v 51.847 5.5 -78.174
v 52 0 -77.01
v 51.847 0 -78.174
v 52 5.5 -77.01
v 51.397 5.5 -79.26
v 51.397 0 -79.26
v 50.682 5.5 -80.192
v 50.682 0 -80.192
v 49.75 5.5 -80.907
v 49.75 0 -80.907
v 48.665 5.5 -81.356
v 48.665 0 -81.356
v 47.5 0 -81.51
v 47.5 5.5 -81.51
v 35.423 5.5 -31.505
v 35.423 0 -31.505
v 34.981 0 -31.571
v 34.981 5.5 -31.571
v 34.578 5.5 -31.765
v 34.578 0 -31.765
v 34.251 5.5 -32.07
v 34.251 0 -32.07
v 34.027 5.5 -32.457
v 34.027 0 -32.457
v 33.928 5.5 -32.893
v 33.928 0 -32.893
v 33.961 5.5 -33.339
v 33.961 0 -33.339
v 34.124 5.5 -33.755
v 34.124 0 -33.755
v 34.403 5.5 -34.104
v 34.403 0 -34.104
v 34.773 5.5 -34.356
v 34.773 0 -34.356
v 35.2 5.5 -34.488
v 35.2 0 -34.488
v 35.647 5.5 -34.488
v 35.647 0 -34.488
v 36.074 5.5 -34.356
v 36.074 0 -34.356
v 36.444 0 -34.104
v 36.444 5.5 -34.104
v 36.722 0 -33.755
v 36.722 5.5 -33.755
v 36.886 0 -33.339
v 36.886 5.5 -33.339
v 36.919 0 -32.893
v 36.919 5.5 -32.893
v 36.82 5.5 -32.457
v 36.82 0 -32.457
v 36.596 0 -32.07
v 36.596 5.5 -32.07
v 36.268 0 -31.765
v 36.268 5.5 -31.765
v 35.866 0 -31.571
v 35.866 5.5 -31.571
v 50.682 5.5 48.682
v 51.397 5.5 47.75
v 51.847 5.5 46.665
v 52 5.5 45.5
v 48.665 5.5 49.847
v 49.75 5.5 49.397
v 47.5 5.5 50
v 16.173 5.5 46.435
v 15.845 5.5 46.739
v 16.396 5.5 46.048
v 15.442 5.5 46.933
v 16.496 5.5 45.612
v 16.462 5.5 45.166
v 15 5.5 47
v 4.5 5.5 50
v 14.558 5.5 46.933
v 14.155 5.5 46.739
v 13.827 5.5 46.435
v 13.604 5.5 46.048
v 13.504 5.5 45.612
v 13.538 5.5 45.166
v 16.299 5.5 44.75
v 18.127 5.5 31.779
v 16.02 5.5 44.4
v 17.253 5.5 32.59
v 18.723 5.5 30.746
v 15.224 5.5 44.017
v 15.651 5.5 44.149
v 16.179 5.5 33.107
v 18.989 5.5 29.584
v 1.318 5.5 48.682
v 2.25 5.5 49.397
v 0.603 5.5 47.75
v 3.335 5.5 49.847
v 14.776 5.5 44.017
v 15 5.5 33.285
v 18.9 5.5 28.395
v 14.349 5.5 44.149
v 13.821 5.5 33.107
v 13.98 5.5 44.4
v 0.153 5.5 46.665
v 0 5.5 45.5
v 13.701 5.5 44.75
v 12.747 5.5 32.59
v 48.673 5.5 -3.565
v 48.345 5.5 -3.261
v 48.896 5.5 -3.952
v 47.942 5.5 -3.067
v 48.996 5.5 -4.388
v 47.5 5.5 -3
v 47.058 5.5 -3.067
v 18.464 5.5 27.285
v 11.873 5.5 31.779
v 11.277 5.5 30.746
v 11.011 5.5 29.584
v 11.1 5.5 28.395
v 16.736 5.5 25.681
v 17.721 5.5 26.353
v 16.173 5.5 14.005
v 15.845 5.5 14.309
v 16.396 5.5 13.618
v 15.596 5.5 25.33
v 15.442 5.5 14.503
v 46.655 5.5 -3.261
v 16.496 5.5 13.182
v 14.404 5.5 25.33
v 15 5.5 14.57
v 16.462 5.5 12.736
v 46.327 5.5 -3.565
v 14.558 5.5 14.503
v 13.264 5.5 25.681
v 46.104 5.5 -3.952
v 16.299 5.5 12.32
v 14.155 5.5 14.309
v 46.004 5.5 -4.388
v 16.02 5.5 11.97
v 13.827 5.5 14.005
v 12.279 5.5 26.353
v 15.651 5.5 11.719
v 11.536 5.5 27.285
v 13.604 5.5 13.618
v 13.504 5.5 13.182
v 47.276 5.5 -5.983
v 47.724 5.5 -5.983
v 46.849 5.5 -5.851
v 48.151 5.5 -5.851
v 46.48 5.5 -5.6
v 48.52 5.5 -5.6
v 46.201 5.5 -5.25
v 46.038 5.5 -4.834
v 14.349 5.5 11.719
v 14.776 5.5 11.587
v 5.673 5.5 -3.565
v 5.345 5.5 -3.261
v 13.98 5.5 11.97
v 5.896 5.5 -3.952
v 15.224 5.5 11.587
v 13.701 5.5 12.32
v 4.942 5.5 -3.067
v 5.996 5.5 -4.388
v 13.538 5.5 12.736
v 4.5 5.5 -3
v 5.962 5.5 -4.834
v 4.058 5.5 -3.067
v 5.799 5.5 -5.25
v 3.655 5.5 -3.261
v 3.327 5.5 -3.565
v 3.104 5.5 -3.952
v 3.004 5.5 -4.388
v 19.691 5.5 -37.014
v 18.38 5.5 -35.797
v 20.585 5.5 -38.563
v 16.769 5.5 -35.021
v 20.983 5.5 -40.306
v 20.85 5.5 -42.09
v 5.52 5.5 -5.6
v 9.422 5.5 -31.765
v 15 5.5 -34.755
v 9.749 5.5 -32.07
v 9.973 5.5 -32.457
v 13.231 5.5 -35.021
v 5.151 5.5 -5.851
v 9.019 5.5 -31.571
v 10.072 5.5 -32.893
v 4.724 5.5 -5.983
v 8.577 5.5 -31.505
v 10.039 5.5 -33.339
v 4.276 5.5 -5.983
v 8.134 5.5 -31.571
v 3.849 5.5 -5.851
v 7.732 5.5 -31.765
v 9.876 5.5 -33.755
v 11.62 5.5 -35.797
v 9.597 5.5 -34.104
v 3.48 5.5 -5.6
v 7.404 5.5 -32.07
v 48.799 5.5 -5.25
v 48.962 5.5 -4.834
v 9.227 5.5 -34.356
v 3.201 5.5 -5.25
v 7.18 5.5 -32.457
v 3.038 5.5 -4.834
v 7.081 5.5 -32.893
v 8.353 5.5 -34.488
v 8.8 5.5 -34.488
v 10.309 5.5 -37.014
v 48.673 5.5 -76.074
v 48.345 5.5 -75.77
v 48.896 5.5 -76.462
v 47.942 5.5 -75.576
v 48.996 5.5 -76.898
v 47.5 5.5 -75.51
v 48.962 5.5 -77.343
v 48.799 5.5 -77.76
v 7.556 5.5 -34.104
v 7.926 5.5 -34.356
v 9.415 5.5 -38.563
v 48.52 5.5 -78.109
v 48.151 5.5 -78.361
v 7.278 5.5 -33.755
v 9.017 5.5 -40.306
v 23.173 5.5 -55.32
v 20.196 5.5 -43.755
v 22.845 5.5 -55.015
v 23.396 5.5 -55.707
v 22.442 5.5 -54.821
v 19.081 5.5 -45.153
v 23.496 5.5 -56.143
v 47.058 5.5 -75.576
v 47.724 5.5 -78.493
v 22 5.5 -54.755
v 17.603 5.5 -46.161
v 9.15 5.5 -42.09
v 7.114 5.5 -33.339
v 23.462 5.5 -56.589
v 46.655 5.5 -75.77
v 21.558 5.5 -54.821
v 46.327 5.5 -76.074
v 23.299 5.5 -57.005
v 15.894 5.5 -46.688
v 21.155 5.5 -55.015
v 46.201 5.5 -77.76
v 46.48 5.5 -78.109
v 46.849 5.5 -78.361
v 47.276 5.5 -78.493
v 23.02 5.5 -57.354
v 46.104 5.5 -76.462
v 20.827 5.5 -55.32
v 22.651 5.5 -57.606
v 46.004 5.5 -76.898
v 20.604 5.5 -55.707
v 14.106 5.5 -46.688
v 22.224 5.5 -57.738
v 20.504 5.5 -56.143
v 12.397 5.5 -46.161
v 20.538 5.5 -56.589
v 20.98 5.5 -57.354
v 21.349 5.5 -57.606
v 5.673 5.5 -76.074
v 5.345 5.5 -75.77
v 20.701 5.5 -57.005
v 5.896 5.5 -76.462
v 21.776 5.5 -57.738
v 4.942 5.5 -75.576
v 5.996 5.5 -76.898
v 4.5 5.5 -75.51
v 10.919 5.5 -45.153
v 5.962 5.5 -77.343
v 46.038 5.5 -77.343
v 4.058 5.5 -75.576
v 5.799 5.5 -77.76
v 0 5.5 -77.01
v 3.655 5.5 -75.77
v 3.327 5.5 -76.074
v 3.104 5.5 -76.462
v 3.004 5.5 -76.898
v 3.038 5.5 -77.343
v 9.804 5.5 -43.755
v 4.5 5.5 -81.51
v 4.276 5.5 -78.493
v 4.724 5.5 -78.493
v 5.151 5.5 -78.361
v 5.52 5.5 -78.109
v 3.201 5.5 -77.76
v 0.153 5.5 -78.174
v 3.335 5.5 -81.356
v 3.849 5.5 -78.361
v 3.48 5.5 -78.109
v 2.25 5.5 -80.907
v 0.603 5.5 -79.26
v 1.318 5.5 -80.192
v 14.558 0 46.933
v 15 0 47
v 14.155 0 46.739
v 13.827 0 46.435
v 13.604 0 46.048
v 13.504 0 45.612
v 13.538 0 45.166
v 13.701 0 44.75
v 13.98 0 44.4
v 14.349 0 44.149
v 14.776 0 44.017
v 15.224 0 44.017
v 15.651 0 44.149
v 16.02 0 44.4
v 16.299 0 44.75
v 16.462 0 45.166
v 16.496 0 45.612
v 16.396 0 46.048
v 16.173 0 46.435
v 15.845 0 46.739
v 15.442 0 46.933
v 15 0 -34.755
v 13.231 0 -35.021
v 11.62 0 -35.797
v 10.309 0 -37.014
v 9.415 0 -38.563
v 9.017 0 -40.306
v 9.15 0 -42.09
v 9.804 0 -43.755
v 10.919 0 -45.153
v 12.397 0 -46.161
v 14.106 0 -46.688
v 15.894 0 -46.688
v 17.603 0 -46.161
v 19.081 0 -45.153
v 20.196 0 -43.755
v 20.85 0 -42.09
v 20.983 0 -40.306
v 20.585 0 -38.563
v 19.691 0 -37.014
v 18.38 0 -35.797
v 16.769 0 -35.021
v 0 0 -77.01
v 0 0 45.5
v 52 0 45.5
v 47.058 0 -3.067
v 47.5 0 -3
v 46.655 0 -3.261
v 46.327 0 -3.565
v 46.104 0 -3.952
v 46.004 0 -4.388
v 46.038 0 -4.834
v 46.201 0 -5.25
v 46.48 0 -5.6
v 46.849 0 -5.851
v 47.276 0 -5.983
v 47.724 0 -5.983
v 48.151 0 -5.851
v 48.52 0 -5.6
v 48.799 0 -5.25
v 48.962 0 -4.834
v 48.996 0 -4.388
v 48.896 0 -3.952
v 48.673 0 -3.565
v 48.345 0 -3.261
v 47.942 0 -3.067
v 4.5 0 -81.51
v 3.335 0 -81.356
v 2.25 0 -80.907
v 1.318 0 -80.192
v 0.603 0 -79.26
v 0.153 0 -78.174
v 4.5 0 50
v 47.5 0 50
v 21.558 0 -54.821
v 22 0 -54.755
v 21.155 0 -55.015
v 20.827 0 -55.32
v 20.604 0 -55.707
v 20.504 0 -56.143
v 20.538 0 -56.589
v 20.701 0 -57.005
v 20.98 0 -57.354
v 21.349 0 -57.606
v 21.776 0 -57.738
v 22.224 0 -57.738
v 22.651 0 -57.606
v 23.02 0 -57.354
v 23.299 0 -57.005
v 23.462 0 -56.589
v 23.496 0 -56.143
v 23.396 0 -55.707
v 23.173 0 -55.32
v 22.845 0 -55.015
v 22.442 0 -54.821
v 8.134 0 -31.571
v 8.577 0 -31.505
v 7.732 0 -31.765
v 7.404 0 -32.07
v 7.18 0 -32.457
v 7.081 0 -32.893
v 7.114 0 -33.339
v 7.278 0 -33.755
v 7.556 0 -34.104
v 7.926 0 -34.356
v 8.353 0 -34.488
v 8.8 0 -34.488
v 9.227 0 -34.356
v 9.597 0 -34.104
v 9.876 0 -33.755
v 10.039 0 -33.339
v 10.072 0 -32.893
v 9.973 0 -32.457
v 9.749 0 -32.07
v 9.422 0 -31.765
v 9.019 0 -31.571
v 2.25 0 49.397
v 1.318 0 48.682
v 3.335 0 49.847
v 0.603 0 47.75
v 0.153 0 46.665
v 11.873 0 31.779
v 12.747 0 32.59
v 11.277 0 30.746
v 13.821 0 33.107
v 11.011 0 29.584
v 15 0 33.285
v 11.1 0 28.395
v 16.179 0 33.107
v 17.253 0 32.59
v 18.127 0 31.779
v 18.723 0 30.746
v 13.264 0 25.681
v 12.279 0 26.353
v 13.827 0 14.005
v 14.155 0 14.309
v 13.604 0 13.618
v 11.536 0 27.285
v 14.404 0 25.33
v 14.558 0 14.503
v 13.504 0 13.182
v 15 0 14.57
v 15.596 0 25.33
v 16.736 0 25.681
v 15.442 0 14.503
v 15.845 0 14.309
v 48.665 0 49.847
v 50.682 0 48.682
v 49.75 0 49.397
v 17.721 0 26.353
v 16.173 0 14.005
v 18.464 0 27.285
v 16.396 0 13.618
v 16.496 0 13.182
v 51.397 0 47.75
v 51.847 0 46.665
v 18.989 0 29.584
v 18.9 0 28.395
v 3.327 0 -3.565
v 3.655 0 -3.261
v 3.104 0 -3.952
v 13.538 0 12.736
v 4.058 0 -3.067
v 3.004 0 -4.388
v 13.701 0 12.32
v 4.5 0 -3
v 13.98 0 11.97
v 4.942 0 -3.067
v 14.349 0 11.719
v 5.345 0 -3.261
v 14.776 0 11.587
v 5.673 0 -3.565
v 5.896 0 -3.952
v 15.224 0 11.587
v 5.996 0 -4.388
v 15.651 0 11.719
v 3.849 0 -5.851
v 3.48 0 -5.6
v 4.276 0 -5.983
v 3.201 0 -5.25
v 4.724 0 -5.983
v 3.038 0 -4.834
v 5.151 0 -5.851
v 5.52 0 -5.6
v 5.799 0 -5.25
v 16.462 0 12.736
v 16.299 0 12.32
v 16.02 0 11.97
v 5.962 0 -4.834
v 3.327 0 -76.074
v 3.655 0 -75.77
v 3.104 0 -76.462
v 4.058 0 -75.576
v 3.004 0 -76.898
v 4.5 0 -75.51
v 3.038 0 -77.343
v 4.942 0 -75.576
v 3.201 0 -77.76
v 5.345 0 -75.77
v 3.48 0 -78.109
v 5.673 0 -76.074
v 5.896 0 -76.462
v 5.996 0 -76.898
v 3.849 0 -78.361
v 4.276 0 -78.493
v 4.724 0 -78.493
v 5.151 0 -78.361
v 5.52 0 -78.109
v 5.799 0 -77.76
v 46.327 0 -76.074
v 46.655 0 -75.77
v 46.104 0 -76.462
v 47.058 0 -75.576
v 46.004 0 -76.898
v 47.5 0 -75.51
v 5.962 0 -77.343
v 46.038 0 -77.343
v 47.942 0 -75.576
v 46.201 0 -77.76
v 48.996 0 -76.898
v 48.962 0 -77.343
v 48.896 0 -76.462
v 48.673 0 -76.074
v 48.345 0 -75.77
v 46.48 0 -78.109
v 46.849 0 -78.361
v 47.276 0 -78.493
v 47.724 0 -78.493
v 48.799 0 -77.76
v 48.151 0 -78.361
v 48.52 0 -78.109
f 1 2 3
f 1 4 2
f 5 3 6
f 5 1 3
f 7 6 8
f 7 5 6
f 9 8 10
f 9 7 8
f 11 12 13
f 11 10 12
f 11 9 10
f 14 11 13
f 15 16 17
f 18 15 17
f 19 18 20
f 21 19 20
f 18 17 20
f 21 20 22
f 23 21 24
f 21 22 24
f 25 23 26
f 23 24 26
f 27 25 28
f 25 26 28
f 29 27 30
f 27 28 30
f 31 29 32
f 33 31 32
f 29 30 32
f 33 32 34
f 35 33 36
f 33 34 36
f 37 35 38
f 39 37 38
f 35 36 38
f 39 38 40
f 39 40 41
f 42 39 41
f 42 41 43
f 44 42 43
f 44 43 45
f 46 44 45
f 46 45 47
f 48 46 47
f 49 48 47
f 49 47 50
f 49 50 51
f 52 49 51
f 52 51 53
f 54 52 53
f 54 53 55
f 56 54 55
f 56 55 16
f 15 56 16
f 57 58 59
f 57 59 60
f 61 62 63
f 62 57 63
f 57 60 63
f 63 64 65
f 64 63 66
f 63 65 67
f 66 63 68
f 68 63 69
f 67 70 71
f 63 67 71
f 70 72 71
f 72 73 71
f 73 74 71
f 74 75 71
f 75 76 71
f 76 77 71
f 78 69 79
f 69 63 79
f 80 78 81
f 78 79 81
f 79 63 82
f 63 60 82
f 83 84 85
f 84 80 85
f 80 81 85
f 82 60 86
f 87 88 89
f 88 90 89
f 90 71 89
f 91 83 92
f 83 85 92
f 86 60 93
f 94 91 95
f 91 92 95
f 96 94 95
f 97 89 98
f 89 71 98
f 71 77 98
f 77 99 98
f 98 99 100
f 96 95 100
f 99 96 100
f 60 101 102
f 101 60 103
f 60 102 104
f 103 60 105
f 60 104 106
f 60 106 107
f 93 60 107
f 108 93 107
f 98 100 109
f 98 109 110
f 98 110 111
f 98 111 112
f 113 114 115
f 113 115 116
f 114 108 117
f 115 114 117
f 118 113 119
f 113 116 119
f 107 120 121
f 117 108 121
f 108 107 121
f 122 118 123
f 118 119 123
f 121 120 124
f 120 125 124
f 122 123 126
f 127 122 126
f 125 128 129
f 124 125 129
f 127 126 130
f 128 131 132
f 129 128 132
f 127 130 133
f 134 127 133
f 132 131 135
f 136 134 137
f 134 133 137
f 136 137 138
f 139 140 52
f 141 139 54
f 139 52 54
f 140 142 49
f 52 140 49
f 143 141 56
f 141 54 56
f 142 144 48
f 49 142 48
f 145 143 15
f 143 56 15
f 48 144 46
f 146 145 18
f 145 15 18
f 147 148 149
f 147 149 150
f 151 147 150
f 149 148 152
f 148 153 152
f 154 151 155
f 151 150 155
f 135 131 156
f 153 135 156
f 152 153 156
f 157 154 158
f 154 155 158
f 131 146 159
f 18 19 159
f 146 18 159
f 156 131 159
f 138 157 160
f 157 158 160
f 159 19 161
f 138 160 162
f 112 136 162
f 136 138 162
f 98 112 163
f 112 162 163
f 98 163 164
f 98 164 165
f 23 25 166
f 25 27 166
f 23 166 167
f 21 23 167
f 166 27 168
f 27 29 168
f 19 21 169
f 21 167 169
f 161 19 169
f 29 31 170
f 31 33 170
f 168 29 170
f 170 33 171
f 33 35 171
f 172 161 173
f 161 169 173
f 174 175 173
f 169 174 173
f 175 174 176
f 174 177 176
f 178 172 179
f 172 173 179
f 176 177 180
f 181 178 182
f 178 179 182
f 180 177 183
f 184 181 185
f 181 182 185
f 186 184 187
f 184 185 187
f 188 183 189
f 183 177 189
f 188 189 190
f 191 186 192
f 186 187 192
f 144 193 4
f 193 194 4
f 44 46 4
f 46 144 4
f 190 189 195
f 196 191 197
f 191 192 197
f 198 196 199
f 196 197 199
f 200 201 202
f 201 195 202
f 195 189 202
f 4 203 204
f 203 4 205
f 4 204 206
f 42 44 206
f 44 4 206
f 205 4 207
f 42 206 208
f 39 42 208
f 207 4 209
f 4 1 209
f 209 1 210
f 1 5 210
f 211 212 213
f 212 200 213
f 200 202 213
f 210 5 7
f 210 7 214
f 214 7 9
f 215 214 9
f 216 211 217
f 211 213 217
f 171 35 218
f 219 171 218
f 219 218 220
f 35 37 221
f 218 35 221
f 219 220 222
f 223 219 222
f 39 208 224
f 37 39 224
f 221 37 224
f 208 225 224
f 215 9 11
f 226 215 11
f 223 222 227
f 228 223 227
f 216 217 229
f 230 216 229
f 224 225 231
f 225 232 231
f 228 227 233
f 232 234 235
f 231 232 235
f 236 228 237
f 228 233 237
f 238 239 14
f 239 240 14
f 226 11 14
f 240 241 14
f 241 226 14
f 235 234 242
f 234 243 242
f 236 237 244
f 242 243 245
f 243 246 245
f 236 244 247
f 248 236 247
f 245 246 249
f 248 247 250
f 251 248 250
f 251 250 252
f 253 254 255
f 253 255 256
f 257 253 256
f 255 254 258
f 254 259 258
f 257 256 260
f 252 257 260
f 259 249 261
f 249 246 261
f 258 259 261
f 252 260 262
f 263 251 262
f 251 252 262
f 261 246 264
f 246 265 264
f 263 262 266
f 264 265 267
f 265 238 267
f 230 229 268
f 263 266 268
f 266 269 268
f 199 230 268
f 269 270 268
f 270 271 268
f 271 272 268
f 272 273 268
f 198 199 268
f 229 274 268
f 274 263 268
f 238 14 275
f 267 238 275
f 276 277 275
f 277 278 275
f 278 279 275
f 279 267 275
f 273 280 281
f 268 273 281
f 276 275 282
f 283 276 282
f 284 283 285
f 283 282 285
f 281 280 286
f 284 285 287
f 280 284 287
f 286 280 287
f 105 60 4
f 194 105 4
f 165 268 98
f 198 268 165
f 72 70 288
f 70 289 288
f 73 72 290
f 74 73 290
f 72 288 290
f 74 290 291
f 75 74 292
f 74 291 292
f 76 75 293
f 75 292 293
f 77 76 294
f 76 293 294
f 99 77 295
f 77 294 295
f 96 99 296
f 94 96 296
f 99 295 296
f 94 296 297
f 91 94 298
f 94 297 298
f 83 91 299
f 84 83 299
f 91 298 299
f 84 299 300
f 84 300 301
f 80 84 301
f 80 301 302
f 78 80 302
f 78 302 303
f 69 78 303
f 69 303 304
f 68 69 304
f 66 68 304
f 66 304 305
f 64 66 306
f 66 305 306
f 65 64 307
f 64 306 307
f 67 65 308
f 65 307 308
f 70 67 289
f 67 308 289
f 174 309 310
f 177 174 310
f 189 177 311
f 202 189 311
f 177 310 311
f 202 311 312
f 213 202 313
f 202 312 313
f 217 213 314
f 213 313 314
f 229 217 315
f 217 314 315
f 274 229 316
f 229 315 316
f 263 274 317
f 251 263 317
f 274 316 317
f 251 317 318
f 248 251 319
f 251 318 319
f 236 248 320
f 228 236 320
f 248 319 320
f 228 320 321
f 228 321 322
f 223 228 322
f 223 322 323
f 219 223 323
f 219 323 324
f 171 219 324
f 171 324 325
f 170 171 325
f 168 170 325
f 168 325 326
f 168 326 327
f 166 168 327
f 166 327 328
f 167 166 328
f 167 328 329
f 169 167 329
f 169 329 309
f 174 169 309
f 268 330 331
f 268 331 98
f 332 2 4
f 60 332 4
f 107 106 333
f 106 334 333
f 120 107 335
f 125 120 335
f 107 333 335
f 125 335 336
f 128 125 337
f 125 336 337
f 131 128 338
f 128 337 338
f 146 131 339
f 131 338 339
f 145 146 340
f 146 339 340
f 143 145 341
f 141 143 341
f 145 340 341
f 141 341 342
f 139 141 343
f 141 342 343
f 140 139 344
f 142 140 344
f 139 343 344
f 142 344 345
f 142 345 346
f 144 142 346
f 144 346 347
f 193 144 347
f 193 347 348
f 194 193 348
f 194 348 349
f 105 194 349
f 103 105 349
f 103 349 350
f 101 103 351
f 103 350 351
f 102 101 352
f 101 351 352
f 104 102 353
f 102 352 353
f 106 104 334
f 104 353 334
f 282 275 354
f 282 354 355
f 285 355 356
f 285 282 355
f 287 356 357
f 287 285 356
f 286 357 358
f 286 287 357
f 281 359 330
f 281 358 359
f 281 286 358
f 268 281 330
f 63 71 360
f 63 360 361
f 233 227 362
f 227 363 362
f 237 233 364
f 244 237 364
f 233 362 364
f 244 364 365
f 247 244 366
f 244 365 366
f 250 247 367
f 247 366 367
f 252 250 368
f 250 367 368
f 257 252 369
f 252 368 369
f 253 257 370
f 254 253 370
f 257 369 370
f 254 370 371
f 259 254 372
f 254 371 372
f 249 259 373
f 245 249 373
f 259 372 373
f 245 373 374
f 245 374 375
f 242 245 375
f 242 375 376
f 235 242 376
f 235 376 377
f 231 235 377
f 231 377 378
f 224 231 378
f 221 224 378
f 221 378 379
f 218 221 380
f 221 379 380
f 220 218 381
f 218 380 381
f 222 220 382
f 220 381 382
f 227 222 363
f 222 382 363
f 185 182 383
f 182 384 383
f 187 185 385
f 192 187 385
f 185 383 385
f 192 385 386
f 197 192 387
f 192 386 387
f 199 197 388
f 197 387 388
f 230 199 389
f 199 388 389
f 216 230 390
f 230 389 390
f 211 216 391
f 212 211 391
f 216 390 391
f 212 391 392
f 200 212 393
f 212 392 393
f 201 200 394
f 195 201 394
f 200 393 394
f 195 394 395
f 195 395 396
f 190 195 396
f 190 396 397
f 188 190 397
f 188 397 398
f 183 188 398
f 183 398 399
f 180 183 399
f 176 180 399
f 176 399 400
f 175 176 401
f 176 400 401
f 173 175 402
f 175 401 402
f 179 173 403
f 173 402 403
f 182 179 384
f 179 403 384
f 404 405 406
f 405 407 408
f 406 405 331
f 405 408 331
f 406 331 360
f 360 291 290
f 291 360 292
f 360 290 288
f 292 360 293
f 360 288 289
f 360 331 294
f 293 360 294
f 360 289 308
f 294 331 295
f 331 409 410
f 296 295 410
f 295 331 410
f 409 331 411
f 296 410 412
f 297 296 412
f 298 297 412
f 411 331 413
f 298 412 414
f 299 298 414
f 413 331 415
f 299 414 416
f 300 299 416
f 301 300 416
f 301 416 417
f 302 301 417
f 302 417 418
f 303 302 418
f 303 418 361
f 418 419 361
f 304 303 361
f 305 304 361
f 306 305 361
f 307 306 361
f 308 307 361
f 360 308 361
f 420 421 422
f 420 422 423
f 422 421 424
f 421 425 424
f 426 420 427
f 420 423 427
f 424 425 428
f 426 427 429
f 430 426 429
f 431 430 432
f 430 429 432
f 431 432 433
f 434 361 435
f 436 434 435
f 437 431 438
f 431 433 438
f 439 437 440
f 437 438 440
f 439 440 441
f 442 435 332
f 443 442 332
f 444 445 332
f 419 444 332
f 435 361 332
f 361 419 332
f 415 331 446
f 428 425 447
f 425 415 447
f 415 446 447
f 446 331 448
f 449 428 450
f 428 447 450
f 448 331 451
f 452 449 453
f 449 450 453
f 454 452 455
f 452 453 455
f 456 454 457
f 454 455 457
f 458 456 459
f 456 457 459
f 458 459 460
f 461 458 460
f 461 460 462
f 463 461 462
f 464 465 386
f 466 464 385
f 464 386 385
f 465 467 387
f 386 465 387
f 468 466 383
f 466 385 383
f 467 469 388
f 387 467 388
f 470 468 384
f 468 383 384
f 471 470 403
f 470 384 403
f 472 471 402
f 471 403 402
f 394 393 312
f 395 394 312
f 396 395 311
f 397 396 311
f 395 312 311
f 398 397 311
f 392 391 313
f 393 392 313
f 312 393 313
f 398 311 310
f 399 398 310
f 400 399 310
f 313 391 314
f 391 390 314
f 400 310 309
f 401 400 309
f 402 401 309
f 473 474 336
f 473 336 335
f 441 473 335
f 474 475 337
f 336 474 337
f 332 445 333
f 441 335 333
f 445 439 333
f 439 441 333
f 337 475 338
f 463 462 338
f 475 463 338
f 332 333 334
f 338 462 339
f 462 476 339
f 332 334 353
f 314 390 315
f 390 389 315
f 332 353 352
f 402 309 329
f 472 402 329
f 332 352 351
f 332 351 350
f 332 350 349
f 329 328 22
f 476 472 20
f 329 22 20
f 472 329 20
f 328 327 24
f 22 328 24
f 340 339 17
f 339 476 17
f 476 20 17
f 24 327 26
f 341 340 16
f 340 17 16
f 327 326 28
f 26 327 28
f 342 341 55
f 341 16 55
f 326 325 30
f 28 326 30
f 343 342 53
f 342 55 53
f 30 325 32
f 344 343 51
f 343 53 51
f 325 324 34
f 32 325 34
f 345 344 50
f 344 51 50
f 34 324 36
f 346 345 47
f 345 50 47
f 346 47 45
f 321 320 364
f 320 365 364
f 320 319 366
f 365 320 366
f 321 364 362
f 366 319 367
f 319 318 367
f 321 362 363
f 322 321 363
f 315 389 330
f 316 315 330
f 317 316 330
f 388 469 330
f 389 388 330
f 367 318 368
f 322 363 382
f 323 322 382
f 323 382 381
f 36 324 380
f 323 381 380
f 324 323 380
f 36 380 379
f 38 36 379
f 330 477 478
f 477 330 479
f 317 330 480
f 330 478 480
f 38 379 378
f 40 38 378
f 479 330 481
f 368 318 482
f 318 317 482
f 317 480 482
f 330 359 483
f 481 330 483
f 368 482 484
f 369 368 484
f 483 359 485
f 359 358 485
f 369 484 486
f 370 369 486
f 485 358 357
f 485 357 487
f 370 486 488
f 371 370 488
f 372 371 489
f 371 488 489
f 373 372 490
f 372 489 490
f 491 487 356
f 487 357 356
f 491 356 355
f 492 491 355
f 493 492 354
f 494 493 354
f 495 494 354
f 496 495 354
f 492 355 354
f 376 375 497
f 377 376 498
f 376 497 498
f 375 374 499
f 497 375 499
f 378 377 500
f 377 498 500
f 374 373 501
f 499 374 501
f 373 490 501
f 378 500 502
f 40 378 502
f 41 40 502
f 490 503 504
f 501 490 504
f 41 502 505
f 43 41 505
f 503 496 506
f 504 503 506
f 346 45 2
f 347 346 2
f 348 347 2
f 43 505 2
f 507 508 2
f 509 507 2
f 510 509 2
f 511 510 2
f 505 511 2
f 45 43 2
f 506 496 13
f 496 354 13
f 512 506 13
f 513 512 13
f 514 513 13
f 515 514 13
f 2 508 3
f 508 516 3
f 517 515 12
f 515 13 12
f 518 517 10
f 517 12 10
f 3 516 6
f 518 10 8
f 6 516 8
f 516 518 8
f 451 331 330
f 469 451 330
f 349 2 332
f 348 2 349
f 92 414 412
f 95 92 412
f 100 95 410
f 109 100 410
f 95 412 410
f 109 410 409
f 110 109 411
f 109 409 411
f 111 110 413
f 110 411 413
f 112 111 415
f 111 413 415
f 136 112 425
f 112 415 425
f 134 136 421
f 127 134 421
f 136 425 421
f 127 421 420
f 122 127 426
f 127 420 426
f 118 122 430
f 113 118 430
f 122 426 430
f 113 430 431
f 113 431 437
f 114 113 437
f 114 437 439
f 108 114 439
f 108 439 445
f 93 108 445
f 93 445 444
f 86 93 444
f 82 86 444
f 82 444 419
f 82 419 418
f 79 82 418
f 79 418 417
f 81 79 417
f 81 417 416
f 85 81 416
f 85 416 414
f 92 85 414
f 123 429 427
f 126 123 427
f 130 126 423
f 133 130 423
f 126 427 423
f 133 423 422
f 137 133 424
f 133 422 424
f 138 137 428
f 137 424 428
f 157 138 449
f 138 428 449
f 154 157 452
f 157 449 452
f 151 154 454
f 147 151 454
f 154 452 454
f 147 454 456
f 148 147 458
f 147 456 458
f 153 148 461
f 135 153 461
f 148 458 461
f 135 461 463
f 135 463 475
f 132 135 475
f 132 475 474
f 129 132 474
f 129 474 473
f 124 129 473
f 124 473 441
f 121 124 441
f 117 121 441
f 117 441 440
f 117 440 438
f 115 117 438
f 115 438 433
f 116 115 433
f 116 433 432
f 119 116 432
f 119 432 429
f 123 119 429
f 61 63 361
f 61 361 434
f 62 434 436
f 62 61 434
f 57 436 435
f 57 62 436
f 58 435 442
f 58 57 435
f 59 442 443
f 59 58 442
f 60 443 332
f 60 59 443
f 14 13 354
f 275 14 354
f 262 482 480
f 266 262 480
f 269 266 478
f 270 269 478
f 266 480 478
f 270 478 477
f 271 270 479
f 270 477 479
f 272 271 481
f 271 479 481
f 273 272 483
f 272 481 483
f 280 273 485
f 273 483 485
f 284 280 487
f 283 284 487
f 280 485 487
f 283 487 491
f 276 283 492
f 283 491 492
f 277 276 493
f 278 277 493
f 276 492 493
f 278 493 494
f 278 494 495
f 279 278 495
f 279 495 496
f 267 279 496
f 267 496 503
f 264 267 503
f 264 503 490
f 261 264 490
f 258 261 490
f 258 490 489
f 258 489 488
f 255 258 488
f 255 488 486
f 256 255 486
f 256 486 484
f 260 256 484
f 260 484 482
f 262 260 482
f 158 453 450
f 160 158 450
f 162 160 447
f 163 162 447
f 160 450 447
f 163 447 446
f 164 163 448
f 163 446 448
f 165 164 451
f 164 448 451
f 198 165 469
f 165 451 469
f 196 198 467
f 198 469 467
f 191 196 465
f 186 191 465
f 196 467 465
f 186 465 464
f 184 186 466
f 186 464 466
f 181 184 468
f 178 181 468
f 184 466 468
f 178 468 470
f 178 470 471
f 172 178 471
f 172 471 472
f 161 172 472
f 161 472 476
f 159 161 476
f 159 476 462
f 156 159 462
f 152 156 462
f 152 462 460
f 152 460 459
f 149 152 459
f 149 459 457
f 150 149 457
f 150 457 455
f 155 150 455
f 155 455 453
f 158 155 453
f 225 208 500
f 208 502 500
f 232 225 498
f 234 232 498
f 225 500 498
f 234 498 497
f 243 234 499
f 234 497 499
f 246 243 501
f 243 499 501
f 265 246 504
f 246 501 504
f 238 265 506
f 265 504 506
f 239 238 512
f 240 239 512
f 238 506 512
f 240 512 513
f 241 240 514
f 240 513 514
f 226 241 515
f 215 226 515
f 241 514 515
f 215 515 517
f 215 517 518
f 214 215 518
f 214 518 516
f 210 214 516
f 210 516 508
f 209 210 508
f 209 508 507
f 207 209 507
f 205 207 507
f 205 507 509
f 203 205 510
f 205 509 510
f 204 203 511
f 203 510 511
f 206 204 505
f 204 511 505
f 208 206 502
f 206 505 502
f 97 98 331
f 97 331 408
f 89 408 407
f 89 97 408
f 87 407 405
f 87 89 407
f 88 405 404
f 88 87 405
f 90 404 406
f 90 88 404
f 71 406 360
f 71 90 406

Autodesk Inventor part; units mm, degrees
ref_plane "YZ Plane" through (0, 0, 0) normal (1, 0, 0) x (0, 1, 0)
ref_plane "XZ Plane" through (0, 0, 0) normal (0, 1, 0) x (-1, 0, 0)
ref_plane "XY Plane" through (0, 0, 0) normal (0, 0, 1) x (1, 0, 0)
sketch "スケッチ1" plane through (0, 0, 0) normal (0, 1, 0) x (-1, 0, 0)
  line L0 (0, 0) -> (-52, 0)
  line L1 (-52, 0) -> (-52, -81.5097)
  line L2 (-52, -81.5097) -> (0, -81.5097)
  line L3 (0, -81.5097) -> (0, 0)
  dimension "d0" = 81.5097
  dimension "d1" = 52
extrude "押し出し1" add sketch "スケッチ1" along normal blind 5.5
sketch "スケッチ2" plane through (0, 5.5, 0) normal (0, 1, 0) x (1, 0, 0)
  line L0 (0, 0) -> (52, 0) projected
  line L1 (52, 81.5097) -> (0, 81.5097) projected
  line L2 (52, 0) -> (52, 81.5097) projected
  line L3 (0, 81.5097) -> (0, 0) projected
  point P0 (4.5, 4.5)
  point P1 (4.5, 77.0097)
  point P2 (47.5, 77.0097)
  point P3 (47.5, 4.5)
  dimension "d4" = 4.5
  dimension "d5" = 4.5
  dimension "d6" = 4.5
  dimension "d7" = 4.5
  dimension "d8" = 4.5
  dimension "d9" = 4.5
  dimension "d10" = 4.5
  dimension "d11" = 4.5
hole "穴1" at (4.5, 5.5, -4.5) at (4.5, 5.5, -77.0097) at (47.5, 5.5, -77.0097) at (47.5, 5.5, -4.5) direction (0, -1, 0) diameter 3 end through all
sketch "スケッチ3" plane through (0, 5.5, 0) normal (0, 1, 0) x (1, 0, 0)
  circle A0 centre (22, 40.7548) radius 15.5
  line L0 (0, 0) -> (52, 0) projected
  line L1 (52, 81.5097) -> (0, 81.5097) projected
  line L2 (52, 0) -> (52, 81.5097) projected
  line L3 (22, 40.7548) -> (35.4234, 33.0048)
  line L4 (22, 40.7548) -> (37.5, 40.7548) construction
  line L5 (22, 40.7548) -> (8.5766, 33.0048)
  line L6 (22, 40.7548) -> (22, 56.2548)
  line L7 (22, 40.7548) -> (37.5, 40.7548) construction
  point P0 (4.5, 0)
  point P1 (47.5, 0)
  point P2 (47.5, 81.5097)
  point P3 (4.5, 81.5097)
  point P4 (52, 4.5)
  point P5 (52, 77.0097)
  dimension "d20" = 31
  dimension "d21" = 81.5097
  dimension "d22" = 40.7548
  dimension "d23" = 30
  dimension "d25" = 90
  dimension "d43" = 120
  dimension "d44" = 120
hole "穴2" at (35.4234, 5.5, -33.0048) at (22, 5.5, -56.2548) at (8.5766, 5.5, -33.0048) direction (0, -1, 0) diameter 3 end through all
sketch "スケッチ4" plane through (0, 5.5, 0) normal (0, 1, 0) x (1, 0, 0)
  line L0 (0, 0) -> (52, 0) projected
  line L1 (52, 81.5097) -> (0, 81.5097) projected
  line L2 (52, 0) -> (52, 81.5097) projected
  point P0 (15, 40.7548)
  point P1 (4.5, 0)
  point P2 (47.5, 0)
  point P3 (47.5, 81.5097)
  point P4 (4.5, 81.5097)
  point P5 (52, 4.5)
  point P6 (52, 77.0097)
  dimension "d33" = 81.5097
  dimension "d34" = 40.7548
  dimension "d35" = 37
hole "穴3" at (15, 5.5, -40.7548) direction (0, -1, 0) diameter 12 end through all
sketch "スケッチ5" plane through (0, 0, 0) normal (0, 0, 1) x (1, 0, 0)
  line L0 (0, 0) -> (0, 5.5) projected
  line L1 (52, 0) -> (52, 5.5) projected
  line L2 (0, 0) -> (52, 0)
  line L3 (52, 0) -> (52, 5.5)
  line L4 (52, 5.5) -> (0, 5.5)
  line L5 (0, 5.5) -> (0, 0)
extrude "押し出し2" add sketch "スケッチ5" along normal blind 50
sketch "スケッチ6" plane through (0, 5.5, 0) normal (0, 1, 0) x (1, 0, 0)
  line L0 (0, 81.5097) -> (0, -50) projected
  circle A0 centre (15, 40.7548) radius 6 projected
  line L1 (52, -50) -> (0, -50) projected
  point P0 (0, 0)
  point P1 (15, -45.5)
  point P2 (15, -13.07)
  dimension "d47" = 15
  dimension "d48" = 15
  dimension "d49" = 15
  dimension "d57" = 32.43
  dimension "d58" = 4.5
hole "穴4" at (15, 5.5, 45.5) at (15, 5.5, 13.07) direction (0, -1, 0) diameter 3 end through all
sketch "スケッチ7" plane through (0, 5.5, 0) normal (0, 1, 0) x (1, 0, 0)
  circle A0 centre (15, -13.07) radius 1.5 projected
  circle A1 centre (15, -45.5) radius 1.5 projected
  line L0 (0, 81.5097) -> (0, -50) projected
  point P0 (0, 0)
  point P1 (15, -29.285)
  dimension "d59" = 32.43
  dimension "d60" = 15
  dimension "d61" = 15
  dimension "d62" = 16.215
hole "穴5" at (15, 5.5, 29.285) direction (0, -1, 0) diameter 8 end through all
fillet "フィレット2" radius 4.5 4 edges at (52, 2.75, 50) (0, 2.75, 50) (52, 2.75, -81.5097) (0, 2.75, -81.5097)
equation "\"d6\" = d5"
equation "\"d7\" = d4"
equation "\"d22\" = 0.5 * d21"
equation "\"d44\" = d43"
equation "\"d34\" = 0.5 * d33"
equation "\"d48\" = d47"
equation "\"d49\" = d48"
equation "\"d61\" = d60"
equation "\"d62\" = 0.5 * d59"
properties part number "ロボット回転t5.5" material "木材 (カエデ材)"
